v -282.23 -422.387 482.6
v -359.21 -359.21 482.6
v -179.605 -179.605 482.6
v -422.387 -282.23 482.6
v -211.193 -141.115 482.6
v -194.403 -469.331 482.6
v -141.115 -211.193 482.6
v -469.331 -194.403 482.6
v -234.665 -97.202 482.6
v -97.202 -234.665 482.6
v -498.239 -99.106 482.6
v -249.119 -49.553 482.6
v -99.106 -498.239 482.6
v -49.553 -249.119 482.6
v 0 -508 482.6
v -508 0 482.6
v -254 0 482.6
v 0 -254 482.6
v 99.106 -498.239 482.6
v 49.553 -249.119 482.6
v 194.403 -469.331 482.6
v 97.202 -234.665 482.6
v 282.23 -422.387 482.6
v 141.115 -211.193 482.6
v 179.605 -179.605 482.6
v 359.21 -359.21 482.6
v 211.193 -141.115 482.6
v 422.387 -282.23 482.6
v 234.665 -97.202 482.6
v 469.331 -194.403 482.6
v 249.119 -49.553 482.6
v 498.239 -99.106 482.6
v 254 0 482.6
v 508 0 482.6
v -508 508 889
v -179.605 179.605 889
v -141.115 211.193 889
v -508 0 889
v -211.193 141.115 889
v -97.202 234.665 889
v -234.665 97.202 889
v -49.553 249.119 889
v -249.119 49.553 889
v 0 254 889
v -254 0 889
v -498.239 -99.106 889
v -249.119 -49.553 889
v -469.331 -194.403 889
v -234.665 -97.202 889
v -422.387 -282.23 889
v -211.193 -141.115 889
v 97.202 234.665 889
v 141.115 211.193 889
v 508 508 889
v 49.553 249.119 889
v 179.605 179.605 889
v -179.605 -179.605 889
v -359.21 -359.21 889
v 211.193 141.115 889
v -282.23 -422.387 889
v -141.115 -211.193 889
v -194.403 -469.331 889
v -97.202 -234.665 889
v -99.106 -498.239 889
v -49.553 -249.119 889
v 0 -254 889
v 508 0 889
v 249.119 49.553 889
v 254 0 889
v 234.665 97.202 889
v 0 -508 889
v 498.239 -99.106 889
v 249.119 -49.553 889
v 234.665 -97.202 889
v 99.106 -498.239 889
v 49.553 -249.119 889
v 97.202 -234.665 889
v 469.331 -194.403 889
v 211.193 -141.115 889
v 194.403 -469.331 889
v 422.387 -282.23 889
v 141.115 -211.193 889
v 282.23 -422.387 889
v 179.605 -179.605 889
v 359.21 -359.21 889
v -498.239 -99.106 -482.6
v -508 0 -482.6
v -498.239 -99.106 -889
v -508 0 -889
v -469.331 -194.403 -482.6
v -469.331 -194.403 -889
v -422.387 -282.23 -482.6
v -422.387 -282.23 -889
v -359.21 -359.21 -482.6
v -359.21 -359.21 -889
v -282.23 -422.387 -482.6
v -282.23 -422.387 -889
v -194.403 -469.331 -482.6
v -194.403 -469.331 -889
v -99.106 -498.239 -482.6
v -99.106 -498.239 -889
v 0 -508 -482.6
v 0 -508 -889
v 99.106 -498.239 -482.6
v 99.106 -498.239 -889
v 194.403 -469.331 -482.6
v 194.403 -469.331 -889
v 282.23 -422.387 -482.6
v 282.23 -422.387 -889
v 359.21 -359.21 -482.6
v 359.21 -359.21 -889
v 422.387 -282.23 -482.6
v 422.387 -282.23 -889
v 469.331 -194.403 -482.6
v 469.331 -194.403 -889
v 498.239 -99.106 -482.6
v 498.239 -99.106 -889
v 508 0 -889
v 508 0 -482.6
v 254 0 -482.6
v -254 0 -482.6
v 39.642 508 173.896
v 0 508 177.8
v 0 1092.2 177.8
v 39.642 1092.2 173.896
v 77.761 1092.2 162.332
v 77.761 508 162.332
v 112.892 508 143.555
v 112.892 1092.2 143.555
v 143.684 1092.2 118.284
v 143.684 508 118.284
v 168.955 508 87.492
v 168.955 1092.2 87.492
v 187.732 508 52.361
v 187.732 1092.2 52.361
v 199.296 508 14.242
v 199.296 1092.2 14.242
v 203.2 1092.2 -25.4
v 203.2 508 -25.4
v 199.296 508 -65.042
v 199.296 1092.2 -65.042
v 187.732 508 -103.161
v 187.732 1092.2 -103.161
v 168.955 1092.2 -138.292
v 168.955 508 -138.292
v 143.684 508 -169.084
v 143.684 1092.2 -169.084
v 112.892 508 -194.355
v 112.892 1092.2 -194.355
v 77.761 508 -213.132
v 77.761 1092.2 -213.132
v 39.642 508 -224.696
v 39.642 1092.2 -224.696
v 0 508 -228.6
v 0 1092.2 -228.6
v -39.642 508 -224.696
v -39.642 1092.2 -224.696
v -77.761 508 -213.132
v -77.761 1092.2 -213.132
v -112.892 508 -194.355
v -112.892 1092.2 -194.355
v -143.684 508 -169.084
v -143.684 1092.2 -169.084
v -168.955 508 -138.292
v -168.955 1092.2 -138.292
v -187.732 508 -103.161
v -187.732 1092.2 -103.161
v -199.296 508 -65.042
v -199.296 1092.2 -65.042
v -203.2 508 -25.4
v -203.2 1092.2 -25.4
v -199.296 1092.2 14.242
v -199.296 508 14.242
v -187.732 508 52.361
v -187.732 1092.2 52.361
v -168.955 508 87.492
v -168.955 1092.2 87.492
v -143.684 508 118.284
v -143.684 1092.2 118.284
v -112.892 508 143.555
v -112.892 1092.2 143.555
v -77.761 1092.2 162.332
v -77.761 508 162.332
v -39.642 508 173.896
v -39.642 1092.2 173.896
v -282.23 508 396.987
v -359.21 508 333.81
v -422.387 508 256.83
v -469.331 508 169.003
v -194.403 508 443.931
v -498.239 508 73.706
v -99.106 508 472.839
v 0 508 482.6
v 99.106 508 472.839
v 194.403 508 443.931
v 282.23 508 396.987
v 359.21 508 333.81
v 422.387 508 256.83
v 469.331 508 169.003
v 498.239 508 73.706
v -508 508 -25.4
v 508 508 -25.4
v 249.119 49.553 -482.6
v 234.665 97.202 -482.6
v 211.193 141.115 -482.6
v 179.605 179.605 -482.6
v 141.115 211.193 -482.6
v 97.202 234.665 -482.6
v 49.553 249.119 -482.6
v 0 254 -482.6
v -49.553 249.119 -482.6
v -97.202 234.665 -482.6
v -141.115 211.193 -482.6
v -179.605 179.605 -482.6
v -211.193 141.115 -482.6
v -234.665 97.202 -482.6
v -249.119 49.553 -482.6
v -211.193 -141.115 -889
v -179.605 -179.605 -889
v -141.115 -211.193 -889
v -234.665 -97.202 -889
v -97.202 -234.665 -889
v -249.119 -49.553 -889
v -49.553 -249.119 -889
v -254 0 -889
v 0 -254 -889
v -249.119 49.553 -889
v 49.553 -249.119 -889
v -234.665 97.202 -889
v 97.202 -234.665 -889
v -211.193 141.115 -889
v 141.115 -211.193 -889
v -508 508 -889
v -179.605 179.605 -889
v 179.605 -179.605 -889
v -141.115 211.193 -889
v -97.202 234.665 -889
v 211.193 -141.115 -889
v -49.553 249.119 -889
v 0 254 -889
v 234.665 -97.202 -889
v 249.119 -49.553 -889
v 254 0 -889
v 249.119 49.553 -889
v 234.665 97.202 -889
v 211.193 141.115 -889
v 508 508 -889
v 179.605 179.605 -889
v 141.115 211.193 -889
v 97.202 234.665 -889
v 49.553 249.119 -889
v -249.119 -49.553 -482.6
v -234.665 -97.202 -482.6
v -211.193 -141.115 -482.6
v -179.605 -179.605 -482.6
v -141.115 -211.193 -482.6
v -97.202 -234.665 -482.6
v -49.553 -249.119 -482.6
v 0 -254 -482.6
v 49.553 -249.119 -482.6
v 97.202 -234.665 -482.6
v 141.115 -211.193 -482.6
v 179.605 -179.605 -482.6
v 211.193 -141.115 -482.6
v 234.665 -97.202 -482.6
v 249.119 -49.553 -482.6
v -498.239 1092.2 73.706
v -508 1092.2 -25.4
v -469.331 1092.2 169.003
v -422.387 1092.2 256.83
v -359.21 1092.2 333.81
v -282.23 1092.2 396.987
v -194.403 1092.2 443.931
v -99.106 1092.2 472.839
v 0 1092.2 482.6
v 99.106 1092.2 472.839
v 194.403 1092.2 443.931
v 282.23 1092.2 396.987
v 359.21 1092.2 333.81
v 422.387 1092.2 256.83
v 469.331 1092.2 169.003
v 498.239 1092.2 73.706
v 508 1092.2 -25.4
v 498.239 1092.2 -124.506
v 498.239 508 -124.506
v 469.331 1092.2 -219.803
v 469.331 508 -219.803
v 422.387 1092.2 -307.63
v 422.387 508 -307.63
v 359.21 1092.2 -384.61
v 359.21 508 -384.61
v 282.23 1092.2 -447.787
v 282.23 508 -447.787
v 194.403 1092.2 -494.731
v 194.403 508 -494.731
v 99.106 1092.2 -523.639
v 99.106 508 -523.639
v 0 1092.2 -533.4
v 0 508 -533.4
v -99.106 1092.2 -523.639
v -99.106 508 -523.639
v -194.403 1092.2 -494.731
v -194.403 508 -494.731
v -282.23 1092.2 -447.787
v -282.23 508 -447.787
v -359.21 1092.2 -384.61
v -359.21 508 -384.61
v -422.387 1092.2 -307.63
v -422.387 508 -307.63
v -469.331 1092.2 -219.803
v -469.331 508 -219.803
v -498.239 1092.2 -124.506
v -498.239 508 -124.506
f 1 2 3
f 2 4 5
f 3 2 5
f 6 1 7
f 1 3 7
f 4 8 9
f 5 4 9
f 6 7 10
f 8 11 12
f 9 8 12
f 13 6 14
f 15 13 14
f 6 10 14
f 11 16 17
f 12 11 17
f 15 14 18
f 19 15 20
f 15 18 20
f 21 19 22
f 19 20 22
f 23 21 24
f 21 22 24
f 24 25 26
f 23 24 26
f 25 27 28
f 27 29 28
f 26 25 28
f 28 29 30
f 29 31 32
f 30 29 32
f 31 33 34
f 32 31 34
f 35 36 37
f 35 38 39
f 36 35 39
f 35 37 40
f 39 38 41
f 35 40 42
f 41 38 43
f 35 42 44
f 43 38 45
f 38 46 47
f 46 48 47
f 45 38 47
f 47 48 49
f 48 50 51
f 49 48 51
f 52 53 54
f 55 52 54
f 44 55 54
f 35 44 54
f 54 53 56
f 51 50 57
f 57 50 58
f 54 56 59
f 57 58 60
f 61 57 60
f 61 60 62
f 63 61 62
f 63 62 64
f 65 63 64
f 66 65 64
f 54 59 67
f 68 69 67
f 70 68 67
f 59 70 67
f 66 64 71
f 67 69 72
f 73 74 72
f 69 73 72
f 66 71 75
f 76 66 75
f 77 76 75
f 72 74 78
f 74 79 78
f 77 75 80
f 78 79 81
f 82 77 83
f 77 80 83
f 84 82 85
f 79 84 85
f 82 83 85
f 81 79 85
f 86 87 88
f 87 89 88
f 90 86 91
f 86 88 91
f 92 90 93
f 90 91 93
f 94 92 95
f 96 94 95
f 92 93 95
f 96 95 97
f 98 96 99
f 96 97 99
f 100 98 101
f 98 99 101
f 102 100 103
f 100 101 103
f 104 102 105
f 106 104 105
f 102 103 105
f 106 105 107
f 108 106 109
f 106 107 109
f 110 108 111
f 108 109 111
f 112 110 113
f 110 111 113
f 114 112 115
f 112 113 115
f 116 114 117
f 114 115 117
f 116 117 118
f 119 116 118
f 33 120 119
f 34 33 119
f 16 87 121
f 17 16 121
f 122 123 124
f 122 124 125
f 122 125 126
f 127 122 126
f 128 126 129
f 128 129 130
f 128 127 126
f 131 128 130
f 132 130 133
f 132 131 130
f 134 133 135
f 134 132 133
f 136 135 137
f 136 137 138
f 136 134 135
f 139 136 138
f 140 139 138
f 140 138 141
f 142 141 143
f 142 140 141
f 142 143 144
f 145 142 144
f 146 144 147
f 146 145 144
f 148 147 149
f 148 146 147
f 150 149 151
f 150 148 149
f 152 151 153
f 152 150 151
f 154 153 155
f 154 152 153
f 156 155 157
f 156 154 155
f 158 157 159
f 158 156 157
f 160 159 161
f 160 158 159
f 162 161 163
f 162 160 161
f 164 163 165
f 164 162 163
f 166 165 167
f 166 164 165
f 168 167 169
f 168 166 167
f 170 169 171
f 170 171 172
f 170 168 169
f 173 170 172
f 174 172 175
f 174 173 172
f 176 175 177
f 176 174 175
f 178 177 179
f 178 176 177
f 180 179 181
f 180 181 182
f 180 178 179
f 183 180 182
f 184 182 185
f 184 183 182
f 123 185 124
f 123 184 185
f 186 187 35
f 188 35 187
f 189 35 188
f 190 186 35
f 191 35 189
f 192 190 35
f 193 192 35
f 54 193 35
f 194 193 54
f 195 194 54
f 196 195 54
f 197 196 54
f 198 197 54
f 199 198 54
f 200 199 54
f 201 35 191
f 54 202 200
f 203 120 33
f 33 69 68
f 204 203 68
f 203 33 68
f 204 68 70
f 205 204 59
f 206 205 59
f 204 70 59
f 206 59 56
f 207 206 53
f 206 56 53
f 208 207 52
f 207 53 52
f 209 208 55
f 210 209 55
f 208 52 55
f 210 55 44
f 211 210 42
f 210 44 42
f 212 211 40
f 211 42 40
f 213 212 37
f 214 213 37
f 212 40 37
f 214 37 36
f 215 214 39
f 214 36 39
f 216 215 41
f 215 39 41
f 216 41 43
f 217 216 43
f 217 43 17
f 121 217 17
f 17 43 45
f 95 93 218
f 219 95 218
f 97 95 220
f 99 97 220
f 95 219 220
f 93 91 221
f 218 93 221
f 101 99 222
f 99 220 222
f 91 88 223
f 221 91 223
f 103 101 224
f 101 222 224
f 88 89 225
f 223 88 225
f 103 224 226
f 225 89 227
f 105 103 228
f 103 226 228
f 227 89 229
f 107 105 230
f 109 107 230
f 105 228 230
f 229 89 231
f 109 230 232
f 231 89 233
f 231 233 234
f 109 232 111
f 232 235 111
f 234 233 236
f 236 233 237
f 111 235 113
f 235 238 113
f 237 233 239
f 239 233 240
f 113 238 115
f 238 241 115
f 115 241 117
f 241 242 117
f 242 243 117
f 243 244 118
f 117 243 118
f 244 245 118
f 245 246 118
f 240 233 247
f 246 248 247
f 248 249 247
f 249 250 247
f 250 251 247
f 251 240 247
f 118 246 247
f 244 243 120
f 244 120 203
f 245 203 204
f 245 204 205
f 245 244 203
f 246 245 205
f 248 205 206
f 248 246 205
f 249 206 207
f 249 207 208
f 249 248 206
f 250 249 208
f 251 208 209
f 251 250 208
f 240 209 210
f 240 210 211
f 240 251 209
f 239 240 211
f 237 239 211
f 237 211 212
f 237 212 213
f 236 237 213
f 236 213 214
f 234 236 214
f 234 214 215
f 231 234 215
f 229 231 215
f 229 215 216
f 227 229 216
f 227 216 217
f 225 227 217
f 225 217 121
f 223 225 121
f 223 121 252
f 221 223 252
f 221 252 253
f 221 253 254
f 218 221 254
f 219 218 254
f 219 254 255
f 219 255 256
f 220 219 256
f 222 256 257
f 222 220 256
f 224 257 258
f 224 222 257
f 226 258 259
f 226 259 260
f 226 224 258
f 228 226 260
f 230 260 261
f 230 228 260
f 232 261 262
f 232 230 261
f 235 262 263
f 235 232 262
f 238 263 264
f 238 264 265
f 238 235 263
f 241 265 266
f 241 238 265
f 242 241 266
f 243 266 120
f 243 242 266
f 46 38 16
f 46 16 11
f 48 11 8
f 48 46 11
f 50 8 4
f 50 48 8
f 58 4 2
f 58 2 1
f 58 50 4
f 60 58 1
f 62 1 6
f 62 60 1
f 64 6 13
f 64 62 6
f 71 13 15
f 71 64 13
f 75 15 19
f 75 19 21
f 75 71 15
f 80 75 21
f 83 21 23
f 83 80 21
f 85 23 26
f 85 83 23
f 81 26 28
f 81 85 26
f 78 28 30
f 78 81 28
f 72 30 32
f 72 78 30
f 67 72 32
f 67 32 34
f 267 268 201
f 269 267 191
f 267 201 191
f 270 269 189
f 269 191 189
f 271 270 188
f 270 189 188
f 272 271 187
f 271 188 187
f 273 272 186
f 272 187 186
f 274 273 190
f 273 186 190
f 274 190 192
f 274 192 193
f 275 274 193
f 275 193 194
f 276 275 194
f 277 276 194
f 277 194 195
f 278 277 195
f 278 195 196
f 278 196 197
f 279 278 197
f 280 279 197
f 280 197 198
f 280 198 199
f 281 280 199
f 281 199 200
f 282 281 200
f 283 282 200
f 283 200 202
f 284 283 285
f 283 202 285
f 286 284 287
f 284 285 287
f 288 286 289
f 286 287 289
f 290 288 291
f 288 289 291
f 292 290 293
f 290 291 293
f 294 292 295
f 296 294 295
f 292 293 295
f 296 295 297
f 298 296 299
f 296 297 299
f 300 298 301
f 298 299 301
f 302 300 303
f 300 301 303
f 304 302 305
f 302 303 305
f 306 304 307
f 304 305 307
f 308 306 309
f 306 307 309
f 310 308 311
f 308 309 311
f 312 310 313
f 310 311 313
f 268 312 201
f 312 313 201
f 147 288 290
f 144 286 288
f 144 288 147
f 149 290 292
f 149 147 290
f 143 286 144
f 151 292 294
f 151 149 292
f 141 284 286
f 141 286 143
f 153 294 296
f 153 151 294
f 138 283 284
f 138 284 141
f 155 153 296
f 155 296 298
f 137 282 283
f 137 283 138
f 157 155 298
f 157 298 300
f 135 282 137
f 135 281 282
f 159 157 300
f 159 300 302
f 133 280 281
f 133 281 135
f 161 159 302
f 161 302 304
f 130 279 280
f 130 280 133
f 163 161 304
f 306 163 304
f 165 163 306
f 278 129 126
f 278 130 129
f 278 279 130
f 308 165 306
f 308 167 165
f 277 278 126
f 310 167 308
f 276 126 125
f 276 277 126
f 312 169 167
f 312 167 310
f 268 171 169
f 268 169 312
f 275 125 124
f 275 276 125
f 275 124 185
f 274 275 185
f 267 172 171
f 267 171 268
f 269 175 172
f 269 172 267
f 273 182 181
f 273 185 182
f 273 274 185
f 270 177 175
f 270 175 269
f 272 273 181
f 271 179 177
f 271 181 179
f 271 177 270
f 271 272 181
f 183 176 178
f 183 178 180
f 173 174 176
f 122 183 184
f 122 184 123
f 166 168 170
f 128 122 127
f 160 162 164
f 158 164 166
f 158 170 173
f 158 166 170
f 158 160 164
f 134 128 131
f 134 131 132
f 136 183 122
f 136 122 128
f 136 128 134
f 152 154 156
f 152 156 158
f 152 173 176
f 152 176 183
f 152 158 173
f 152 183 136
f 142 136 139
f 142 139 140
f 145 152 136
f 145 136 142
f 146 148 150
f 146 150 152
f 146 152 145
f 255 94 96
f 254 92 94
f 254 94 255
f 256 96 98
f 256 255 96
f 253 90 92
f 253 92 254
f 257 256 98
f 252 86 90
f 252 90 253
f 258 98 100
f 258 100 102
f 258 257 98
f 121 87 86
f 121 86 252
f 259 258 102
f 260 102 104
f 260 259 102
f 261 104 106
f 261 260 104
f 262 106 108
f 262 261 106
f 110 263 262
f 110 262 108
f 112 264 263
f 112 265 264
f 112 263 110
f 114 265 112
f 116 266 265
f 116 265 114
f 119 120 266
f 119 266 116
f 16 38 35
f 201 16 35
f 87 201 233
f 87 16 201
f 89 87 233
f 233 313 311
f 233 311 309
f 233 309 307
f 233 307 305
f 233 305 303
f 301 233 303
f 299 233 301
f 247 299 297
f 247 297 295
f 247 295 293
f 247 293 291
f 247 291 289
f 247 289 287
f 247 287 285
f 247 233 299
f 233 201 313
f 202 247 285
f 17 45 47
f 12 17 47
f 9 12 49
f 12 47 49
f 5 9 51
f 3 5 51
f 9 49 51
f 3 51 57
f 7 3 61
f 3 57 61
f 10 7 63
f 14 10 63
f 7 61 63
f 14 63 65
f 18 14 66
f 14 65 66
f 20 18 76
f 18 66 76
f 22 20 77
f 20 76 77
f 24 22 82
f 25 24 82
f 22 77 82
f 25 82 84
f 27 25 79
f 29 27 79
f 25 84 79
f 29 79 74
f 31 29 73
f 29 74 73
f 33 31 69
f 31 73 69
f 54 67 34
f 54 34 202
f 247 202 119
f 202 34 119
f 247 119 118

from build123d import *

# Parameters (mm, degrees)
SKETCH1_W           = 1016
SKETCH1_H           = 1778
BOSS_EXTRUDE1_DEPTH = 508
SKETCH2_R           = 508
SKETCH2_R_2         = 203.2
BOSS_EXTRUDE2_DEPTH = 584.2
SKETCH3_R           = 508
BOSS_EXTRUDE3_DEPTH = 406.4
CUT_EXTRUDE1_REACH  = 2149.615
SKETCH5_R           = 254


with BuildPart() as part:
    # Sketch1 → Boss-Extrude1 (new body)
    with BuildSketch(Plane(origin=(0, 0, 0), x_dir=(1, 0, 0), z_dir=(0, 1, 0))):
        Rectangle(SKETCH1_W, SKETCH1_H)
    extrude(amount=BOSS_EXTRUDE1_DEPTH)

    # Sketch2 → Boss-Extrude2 (add)
    with BuildSketch(Plane(origin=(0, 508, 0), x_dir=(1, 0, 0), z_dir=(0, 1, 0))):
        with Locations(Location((0, 25.4, 0), (0, 0, 180))):
            Circle(SKETCH2_R)
        with Locations(Location((0, 25.4, 0), (0, 0, 270))):
            Circle(SKETCH2_R_2, mode=Mode.SUBTRACT)
    extrude(amount=BOSS_EXTRUDE2_DEPTH)

    # Sketch3 → Boss-Extrude3 (add)
    with BuildSketch(Plane.XY.offset(889)):
        Circle(SKETCH3_R)
    boss_extrude3 = extrude(amount=-BOSS_EXTRUDE3_DEPTH)

    # Sketch5 → Cut-Extrude1 (cut, up to next)
    with BuildSketch(Plane.XY.offset(889), mode=Mode.PRIVATE) as cut_extrude1_sk1:
        Circle(SKETCH5_R)
    cut_extrude1_tool1 = extrude(cut_extrude1_sk1.sketch, amount=-CUT_EXTRUDE1_REACH, mode=Mode.PRIVATE) & part.part
    cut_extrude1 = cut_extrude1_tool1.solids().sort_by_distance((0, 0, 889))[0]
    add(cut_extrude1, mode=Mode.SUBTRACT)

    # Mirror1: Boss-Extrude3, Cut-Extrude1 across plane
    add(boss_extrude3.mirror(Plane.XY))
    add(cut_extrude1.mirror(Plane.XY), mode=Mode.SUBTRACT)


solid = part.part
